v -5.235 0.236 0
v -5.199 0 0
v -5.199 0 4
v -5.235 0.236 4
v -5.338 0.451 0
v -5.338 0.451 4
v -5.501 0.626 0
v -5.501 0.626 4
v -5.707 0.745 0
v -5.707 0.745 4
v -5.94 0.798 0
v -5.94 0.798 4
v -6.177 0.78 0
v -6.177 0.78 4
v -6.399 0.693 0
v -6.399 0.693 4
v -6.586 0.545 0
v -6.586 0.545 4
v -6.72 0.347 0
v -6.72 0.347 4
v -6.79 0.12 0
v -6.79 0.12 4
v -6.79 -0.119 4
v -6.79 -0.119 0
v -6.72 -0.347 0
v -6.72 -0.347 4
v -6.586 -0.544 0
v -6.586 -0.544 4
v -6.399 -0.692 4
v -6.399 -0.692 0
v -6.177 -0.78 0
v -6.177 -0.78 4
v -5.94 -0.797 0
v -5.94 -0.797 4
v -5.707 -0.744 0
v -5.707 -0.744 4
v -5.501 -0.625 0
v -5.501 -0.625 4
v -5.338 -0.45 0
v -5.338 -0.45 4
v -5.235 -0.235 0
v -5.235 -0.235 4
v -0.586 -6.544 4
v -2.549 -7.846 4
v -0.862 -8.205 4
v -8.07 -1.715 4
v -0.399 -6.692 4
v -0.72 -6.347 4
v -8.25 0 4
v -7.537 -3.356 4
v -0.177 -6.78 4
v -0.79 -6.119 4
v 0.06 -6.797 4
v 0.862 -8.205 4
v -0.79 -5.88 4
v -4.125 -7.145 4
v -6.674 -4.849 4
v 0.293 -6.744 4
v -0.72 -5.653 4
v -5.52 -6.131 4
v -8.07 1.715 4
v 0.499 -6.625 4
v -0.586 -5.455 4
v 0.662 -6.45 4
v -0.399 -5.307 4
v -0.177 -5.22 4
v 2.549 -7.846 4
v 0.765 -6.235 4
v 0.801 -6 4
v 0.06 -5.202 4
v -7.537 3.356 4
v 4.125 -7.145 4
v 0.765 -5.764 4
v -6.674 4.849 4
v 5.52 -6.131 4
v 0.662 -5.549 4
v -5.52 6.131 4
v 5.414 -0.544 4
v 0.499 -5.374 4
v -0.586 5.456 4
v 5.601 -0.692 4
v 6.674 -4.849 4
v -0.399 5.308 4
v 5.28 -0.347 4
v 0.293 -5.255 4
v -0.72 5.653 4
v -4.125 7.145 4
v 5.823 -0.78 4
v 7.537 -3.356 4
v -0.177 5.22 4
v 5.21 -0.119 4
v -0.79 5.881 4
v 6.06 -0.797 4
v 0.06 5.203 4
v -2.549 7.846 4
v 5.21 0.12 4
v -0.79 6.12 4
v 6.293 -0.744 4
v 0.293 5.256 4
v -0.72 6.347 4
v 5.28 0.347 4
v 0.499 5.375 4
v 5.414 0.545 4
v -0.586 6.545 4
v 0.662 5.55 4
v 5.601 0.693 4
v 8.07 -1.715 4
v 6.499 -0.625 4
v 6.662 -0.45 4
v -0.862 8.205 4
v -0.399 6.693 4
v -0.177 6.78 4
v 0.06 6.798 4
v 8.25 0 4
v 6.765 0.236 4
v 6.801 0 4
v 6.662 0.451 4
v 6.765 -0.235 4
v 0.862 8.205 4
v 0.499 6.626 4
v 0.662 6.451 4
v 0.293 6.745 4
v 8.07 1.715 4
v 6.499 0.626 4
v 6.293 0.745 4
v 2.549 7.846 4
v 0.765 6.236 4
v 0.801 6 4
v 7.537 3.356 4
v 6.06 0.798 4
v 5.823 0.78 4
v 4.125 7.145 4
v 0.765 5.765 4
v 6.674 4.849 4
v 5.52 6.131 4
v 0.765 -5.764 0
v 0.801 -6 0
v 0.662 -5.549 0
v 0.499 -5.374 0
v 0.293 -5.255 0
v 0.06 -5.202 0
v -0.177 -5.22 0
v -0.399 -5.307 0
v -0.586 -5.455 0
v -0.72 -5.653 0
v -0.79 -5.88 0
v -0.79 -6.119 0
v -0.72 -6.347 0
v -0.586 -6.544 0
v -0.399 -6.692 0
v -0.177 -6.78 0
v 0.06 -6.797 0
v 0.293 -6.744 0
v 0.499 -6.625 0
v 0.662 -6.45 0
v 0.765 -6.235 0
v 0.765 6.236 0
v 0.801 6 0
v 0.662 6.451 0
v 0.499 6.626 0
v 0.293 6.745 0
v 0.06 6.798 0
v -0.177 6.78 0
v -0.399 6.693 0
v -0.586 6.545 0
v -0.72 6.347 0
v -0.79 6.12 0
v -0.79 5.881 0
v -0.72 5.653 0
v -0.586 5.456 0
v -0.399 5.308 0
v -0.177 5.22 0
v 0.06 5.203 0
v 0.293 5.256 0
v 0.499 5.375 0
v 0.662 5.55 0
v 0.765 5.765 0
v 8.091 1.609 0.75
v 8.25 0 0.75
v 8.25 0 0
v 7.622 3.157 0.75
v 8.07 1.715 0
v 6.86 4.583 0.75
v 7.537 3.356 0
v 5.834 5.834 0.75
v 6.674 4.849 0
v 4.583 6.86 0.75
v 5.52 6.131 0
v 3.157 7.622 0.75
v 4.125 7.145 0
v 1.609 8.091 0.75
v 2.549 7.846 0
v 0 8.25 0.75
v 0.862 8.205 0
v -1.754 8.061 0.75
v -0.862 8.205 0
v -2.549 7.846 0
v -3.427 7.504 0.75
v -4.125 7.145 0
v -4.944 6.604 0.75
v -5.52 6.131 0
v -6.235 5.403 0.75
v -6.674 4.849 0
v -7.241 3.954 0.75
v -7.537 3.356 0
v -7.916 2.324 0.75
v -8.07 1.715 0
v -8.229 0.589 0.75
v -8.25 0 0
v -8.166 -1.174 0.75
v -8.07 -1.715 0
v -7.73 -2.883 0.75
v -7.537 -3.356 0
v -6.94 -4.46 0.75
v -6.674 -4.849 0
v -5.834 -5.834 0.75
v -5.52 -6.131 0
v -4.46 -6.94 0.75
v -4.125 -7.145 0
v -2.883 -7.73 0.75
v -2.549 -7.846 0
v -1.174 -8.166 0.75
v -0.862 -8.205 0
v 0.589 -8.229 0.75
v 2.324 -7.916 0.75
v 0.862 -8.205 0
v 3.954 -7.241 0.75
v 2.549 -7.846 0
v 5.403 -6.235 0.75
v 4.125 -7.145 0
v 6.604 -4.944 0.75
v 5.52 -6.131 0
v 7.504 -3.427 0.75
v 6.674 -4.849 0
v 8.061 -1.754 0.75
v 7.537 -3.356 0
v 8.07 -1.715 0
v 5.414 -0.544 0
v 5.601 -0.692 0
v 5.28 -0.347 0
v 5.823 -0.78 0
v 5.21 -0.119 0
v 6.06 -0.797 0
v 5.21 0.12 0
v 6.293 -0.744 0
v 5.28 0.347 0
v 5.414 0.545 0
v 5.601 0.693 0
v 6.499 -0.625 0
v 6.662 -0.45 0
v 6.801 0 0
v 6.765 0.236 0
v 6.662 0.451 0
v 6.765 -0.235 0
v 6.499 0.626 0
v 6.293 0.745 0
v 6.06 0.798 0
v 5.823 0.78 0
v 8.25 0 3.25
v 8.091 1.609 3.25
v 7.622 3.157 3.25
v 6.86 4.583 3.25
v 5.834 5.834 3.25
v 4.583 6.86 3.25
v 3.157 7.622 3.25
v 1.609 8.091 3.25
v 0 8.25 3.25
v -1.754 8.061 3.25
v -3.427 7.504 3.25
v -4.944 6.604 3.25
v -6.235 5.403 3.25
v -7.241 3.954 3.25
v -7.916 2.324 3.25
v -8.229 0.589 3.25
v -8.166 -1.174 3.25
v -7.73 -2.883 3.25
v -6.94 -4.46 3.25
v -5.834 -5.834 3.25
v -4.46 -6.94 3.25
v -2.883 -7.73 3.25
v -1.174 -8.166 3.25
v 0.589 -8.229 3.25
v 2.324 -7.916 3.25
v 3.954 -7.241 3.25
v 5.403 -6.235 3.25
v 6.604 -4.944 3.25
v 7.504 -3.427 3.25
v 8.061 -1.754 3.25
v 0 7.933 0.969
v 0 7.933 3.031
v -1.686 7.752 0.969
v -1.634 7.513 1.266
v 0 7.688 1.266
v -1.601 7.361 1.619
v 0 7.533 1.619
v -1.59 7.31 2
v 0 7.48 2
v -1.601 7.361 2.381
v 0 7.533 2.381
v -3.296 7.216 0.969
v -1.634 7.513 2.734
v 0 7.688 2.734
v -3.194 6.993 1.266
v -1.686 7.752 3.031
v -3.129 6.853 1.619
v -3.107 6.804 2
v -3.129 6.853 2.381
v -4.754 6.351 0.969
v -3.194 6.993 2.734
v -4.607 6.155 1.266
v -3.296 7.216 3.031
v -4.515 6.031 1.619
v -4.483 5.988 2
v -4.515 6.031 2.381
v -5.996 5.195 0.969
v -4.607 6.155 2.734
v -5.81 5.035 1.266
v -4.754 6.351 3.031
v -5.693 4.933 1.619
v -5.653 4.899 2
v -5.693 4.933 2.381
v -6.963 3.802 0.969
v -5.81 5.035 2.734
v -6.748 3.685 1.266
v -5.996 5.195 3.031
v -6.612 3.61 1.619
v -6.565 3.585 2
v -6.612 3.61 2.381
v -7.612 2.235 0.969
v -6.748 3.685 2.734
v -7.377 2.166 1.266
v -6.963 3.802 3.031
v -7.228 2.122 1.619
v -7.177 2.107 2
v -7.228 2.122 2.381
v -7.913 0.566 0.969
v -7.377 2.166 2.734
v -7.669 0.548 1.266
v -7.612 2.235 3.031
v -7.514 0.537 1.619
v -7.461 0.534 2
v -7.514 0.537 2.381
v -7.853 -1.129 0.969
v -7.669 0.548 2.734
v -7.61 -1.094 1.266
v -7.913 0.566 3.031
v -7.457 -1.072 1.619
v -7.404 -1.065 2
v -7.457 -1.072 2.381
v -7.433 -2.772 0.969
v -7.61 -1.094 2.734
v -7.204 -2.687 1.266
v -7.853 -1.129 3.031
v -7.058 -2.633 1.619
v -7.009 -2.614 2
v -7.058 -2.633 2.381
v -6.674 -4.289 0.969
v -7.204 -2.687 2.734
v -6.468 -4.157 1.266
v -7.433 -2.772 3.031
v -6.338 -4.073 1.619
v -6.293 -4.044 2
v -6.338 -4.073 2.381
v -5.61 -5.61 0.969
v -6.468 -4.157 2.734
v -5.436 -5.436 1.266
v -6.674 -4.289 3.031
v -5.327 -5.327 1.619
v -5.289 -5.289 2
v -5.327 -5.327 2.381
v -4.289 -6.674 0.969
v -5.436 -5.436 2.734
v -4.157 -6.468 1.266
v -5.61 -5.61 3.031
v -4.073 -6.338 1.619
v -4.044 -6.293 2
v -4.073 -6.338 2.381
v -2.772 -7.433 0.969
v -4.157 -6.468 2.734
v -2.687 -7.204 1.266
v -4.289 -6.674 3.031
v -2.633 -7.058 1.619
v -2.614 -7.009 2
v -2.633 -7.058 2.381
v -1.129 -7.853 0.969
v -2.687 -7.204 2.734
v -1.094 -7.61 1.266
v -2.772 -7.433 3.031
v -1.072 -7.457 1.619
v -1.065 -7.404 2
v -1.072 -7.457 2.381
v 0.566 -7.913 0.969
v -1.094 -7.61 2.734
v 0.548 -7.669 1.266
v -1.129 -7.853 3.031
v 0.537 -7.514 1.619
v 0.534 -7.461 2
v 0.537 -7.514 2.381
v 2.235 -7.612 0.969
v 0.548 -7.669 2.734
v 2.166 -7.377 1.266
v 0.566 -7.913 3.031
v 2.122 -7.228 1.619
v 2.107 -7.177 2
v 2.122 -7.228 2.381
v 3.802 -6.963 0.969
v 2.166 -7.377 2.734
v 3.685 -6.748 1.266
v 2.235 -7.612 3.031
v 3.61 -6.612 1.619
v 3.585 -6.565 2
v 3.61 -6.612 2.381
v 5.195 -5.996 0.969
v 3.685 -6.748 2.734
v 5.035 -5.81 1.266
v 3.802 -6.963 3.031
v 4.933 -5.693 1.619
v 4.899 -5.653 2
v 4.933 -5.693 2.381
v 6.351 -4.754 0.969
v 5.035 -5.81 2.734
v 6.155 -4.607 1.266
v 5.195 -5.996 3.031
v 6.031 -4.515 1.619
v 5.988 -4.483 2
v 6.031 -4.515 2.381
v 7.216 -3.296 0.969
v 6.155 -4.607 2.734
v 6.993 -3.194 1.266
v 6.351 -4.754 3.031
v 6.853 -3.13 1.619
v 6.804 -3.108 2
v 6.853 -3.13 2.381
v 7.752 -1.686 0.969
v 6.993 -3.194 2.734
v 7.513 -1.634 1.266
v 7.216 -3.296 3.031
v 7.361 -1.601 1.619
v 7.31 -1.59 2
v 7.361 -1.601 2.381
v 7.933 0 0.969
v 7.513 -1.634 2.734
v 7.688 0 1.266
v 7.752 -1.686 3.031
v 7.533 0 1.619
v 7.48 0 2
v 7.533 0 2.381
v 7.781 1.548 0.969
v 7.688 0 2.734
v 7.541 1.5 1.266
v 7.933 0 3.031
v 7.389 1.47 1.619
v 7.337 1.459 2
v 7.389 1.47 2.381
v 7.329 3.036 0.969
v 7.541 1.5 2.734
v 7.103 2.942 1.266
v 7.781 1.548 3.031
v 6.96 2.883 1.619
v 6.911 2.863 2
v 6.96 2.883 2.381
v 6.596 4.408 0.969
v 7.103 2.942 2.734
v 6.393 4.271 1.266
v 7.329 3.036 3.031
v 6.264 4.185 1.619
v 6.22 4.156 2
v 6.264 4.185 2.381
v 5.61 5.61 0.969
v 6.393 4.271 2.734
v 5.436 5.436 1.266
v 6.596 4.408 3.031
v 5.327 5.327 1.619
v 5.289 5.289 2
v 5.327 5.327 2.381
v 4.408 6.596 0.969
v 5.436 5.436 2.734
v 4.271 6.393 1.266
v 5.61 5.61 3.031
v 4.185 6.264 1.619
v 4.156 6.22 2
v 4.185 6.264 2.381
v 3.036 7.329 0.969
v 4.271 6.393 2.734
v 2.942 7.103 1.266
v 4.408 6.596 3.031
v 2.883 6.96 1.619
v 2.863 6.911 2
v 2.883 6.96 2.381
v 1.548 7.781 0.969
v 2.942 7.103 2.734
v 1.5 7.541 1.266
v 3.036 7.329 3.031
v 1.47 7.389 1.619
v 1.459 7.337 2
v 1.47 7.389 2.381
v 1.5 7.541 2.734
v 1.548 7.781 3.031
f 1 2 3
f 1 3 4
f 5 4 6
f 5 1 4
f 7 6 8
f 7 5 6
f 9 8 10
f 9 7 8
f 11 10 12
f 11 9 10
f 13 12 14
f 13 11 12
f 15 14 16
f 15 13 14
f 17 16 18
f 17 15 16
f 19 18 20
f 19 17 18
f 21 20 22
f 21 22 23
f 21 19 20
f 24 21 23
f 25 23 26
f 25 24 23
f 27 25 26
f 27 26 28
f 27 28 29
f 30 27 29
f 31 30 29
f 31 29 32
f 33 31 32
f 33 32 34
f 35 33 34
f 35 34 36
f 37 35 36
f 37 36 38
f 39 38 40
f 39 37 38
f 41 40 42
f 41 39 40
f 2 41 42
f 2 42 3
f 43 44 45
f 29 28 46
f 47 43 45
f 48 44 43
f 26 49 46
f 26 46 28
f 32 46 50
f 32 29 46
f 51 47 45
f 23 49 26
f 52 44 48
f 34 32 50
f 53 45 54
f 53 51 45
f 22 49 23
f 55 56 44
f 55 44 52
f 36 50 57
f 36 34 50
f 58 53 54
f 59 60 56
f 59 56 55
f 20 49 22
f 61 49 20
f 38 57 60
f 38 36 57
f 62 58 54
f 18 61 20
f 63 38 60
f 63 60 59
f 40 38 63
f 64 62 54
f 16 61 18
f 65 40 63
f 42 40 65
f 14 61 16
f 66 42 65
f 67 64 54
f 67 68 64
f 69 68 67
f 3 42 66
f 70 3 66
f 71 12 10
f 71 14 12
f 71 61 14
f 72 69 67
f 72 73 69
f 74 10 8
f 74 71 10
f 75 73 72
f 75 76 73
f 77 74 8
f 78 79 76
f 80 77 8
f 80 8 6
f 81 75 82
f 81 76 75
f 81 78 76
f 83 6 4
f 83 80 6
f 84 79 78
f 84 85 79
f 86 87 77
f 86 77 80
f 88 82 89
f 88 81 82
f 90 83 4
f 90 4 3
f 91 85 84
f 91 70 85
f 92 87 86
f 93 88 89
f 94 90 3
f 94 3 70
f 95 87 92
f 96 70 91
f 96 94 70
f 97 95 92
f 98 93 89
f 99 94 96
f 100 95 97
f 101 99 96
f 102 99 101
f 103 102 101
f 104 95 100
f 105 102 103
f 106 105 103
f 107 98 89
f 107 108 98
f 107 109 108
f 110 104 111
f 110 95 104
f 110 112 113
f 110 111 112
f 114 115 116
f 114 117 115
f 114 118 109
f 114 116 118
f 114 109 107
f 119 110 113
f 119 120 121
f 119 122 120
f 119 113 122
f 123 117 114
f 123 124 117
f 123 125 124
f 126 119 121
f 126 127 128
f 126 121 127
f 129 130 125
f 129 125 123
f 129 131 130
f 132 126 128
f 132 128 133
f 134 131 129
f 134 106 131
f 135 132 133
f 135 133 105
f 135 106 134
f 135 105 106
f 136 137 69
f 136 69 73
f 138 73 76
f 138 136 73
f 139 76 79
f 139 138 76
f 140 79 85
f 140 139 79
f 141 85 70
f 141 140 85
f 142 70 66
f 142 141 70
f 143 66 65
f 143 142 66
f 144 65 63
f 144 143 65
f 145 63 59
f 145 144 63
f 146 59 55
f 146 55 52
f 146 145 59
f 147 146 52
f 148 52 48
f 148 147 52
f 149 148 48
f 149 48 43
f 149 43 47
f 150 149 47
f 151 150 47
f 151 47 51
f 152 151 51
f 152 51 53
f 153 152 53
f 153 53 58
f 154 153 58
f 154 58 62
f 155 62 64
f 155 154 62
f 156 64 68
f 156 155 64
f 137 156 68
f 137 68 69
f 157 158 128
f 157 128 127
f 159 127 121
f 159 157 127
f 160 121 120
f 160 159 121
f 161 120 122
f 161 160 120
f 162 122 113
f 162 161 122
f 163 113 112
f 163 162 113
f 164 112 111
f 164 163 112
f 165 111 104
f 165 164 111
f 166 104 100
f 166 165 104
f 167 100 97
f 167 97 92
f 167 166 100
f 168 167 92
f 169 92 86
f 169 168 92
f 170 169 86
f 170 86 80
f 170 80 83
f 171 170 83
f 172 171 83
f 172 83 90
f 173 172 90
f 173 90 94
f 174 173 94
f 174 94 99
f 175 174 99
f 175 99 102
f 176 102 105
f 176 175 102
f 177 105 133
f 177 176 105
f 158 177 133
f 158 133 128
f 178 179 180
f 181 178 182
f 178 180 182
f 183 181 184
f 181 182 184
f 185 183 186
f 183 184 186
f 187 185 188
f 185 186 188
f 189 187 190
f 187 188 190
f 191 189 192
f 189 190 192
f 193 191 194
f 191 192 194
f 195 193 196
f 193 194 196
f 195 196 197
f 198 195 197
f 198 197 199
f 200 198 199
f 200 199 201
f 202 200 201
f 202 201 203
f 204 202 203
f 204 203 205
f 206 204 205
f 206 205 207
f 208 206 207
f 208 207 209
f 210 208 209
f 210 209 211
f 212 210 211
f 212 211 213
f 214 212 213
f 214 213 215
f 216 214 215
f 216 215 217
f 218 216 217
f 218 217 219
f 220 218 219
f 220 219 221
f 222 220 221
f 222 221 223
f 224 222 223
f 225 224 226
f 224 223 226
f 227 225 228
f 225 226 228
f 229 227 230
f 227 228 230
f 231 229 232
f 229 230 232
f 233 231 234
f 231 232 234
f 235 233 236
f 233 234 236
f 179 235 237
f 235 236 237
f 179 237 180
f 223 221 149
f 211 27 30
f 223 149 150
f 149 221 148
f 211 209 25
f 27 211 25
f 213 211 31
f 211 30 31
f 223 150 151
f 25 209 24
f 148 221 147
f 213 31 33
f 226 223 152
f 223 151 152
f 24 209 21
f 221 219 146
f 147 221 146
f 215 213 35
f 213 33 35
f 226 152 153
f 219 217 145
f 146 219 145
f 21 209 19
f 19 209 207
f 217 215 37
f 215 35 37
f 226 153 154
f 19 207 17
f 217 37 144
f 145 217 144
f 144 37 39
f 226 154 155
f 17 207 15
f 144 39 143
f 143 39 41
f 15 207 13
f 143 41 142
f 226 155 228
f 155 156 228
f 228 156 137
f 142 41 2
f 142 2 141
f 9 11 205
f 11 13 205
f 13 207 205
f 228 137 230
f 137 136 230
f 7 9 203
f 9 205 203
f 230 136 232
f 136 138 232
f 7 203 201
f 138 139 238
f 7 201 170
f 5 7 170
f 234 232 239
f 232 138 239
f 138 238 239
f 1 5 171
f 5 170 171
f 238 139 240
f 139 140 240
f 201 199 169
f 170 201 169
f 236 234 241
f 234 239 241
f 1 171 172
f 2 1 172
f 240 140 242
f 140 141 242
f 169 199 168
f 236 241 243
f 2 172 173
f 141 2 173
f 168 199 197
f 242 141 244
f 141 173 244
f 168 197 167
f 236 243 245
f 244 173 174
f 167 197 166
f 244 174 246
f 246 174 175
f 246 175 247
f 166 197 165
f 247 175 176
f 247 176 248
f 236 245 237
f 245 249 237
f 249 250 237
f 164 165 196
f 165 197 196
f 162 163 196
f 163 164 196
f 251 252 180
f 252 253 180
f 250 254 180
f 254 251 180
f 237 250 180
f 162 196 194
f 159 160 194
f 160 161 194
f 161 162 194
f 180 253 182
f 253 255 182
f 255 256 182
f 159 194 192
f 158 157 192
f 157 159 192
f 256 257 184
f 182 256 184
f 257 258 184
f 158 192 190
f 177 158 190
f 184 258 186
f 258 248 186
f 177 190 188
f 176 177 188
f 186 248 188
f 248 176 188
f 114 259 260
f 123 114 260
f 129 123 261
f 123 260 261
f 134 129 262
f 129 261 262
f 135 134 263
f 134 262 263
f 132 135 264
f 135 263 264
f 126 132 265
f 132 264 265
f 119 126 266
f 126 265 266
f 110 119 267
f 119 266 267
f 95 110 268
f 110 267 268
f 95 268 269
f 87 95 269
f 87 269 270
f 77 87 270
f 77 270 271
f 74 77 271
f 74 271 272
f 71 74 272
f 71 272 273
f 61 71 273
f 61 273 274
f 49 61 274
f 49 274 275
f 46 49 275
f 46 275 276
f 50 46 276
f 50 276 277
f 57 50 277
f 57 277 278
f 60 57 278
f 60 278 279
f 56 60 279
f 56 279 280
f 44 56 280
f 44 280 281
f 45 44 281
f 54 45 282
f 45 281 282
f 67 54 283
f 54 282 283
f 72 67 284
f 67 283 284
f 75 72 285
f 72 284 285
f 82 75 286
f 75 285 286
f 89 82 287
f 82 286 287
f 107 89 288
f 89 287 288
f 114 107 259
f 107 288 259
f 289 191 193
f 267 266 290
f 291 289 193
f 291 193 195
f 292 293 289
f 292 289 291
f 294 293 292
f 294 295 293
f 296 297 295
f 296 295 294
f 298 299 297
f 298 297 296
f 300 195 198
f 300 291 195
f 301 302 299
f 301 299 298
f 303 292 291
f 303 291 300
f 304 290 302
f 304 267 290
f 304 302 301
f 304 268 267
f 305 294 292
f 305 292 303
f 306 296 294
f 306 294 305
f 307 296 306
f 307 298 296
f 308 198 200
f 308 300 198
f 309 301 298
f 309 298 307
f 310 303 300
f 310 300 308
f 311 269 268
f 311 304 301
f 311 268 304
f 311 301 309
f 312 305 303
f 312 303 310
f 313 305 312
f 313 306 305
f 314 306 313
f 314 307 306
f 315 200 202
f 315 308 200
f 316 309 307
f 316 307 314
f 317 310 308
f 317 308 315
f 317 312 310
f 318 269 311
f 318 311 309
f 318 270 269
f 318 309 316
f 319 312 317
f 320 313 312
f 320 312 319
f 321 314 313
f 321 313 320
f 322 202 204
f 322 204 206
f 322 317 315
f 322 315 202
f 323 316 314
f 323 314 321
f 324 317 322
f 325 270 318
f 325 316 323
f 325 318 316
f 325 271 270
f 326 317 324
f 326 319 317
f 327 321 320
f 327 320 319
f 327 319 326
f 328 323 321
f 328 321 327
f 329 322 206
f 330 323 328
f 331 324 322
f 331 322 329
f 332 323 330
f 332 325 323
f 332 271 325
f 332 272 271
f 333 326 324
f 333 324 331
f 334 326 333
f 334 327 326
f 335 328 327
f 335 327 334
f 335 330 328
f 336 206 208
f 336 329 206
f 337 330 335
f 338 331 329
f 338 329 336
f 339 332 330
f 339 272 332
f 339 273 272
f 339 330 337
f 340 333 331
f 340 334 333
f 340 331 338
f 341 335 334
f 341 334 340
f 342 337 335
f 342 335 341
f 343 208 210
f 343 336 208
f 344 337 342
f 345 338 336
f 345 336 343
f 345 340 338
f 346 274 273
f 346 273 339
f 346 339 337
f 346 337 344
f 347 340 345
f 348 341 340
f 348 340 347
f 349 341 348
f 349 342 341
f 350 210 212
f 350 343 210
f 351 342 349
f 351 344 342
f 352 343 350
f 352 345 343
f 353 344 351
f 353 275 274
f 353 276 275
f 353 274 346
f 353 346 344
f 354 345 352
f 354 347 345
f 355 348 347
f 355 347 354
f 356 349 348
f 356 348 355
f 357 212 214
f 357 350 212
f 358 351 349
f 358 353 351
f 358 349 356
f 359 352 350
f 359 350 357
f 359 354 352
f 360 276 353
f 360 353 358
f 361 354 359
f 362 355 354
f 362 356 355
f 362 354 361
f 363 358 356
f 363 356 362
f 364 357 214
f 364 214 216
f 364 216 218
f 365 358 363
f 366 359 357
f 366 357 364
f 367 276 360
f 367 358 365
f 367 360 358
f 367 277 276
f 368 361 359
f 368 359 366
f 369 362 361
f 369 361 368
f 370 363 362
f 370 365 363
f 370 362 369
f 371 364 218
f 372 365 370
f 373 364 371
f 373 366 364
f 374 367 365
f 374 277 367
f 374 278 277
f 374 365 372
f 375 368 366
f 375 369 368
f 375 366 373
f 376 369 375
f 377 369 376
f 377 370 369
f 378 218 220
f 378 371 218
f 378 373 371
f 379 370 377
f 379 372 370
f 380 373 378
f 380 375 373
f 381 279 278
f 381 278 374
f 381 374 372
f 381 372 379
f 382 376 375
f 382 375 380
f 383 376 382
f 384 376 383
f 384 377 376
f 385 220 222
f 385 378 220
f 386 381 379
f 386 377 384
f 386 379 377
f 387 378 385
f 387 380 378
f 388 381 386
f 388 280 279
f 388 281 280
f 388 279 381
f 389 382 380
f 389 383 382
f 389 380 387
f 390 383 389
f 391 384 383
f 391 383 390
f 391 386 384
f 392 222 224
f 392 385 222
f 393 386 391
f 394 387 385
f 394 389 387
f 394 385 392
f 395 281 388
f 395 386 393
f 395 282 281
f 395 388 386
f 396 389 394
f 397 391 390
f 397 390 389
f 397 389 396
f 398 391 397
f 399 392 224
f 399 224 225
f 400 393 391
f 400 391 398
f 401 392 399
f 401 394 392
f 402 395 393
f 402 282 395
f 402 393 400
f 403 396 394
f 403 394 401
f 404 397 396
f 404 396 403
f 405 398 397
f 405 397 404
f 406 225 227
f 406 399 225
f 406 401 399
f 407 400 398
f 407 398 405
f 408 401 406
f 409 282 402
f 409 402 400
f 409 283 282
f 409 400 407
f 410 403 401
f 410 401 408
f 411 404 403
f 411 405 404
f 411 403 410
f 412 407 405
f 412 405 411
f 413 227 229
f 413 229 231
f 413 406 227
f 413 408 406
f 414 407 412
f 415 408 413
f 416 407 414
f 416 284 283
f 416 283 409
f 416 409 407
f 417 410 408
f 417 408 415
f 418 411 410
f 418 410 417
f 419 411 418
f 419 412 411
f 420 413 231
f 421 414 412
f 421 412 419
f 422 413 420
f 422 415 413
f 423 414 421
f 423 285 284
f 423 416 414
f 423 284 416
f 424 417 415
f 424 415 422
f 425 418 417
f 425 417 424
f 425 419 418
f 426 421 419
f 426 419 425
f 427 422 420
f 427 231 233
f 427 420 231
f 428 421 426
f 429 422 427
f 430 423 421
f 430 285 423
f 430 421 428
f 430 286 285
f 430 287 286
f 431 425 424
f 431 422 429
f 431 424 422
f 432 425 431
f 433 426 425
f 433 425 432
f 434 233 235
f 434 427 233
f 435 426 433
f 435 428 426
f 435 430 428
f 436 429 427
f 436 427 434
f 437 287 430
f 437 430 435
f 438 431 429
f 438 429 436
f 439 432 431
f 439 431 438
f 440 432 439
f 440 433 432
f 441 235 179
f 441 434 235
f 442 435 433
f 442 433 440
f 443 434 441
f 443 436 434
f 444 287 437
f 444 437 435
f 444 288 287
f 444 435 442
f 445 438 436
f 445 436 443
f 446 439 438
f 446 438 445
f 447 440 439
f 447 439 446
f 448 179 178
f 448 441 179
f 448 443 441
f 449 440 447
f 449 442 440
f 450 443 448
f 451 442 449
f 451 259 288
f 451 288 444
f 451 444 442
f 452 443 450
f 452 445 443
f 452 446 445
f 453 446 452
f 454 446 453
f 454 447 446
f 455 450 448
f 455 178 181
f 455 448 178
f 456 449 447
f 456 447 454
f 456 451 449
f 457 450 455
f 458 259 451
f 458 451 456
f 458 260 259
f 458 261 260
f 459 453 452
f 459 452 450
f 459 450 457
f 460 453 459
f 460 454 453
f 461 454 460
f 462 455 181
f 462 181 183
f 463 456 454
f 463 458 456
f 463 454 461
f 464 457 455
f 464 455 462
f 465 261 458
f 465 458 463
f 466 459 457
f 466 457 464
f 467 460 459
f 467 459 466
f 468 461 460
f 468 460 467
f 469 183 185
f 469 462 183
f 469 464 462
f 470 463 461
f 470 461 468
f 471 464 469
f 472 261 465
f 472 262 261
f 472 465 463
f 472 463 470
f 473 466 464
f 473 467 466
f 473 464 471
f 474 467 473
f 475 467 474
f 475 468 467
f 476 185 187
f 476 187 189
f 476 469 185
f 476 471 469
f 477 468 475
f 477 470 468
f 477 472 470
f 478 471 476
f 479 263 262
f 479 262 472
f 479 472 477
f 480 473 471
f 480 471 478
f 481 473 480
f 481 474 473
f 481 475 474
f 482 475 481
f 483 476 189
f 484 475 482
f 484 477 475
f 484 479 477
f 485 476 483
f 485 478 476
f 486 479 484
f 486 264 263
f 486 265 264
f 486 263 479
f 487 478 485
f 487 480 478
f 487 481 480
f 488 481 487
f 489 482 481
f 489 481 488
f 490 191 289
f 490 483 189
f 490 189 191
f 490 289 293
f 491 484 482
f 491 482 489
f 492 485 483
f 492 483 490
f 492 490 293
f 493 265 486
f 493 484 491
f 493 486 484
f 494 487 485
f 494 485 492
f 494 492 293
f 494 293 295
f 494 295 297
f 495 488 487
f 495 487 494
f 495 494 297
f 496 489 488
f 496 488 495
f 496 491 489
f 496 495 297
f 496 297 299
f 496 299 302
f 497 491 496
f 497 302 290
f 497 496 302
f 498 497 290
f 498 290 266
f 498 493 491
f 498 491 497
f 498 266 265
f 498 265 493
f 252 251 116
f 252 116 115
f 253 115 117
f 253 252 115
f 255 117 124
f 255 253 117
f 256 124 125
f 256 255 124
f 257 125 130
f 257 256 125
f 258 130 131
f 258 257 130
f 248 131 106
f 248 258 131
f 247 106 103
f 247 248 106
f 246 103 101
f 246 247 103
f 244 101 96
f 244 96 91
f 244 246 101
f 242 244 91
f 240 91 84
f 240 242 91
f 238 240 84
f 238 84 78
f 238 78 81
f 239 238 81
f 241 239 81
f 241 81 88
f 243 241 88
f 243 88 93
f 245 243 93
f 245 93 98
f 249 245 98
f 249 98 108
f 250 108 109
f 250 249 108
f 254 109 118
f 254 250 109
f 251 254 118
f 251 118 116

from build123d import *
from OCP.BRepAlgoAPI import BRepAlgoAPI_Cut
from OCP.TopTools import TopTools_ListOfShape

# Parameters (mm, degrees)
SKIZZE2_R                       = 8.25
SKIZZE2_R_2                     = 0.8
AUFSATZ_LINEAR_AUSTRAGEN1_DEPTH = 4


with BuildPart() as part:
    # Skizze2 → Aufsatz-Linear austragen1 (new body)
    with BuildSketch(Plane.XY):
        with Locations((-1.64e-06, -6.336e-06)):
            Circle(SKIZZE2_R)
        with Locations((6.000570744, 0.000379921)):
            Circle(SKIZZE2_R_2, mode=Mode.SUBTRACT)
        with Locations((0.000570744, 6.000379921)):
            Circle(SKIZZE2_R_2, mode=Mode.SUBTRACT)
        with Locations((-5.999429256, 0.000379921)):
            Circle(SKIZZE2_R_2, mode=Mode.SUBTRACT)
        with Locations((0.000570744, -5.999620079)):
            Circle(SKIZZE2_R_2, mode=Mode.SUBTRACT)
    extrude(amount=AUFSATZ_LINEAR_AUSTRAGEN1_DEPTH)


with BuildPart() as schnitt_rotation4_tool:
    # Skizze5 → Schnitt-Rotation4 (revolve)
    with BuildSketch(Plane(origin=(0, 0, 0), x_dir=(0, 0, -1), z_dir=(1, 0, 0))):
        with BuildLine():
            Line((-3.25, 8.249993664), (-0.75, 8.249993664))
            ThreePointArc((-0.75, 8.249993664), (-2, 7.480469675), (-3.25, 8.249993664))
        make_face()
    revolve(axis=Axis((0, 0, 2), (0, 0, 1)))


with BuildPart() as part_1:
    add(part.part)

    # Schnitt-Rotation4: cut by schnitt_rotation4_tool, with a tolerance
    schnitt_rotation4_stock = TopTools_ListOfShape()
    schnitt_rotation4_stock.Append(part_1.part.wrapped)
    schnitt_rotation4_tools = TopTools_ListOfShape()
    schnitt_rotation4_tools.Append(schnitt_rotation4_tool.part.wrapped)
    schnitt_rotation4_cut = BRepAlgoAPI_Cut()
    schnitt_rotation4_cut.SetArguments(schnitt_rotation4_stock)
    schnitt_rotation4_cut.SetTools(schnitt_rotation4_tools)
    schnitt_rotation4_cut.SetFuzzyValue(0.00001)
    schnitt_rotation4_cut.Build()
    add(Compound.cast(schnitt_rotation4_cut.Shape()).solids(), mode=Mode.REPLACE)


solid = part_1.part
